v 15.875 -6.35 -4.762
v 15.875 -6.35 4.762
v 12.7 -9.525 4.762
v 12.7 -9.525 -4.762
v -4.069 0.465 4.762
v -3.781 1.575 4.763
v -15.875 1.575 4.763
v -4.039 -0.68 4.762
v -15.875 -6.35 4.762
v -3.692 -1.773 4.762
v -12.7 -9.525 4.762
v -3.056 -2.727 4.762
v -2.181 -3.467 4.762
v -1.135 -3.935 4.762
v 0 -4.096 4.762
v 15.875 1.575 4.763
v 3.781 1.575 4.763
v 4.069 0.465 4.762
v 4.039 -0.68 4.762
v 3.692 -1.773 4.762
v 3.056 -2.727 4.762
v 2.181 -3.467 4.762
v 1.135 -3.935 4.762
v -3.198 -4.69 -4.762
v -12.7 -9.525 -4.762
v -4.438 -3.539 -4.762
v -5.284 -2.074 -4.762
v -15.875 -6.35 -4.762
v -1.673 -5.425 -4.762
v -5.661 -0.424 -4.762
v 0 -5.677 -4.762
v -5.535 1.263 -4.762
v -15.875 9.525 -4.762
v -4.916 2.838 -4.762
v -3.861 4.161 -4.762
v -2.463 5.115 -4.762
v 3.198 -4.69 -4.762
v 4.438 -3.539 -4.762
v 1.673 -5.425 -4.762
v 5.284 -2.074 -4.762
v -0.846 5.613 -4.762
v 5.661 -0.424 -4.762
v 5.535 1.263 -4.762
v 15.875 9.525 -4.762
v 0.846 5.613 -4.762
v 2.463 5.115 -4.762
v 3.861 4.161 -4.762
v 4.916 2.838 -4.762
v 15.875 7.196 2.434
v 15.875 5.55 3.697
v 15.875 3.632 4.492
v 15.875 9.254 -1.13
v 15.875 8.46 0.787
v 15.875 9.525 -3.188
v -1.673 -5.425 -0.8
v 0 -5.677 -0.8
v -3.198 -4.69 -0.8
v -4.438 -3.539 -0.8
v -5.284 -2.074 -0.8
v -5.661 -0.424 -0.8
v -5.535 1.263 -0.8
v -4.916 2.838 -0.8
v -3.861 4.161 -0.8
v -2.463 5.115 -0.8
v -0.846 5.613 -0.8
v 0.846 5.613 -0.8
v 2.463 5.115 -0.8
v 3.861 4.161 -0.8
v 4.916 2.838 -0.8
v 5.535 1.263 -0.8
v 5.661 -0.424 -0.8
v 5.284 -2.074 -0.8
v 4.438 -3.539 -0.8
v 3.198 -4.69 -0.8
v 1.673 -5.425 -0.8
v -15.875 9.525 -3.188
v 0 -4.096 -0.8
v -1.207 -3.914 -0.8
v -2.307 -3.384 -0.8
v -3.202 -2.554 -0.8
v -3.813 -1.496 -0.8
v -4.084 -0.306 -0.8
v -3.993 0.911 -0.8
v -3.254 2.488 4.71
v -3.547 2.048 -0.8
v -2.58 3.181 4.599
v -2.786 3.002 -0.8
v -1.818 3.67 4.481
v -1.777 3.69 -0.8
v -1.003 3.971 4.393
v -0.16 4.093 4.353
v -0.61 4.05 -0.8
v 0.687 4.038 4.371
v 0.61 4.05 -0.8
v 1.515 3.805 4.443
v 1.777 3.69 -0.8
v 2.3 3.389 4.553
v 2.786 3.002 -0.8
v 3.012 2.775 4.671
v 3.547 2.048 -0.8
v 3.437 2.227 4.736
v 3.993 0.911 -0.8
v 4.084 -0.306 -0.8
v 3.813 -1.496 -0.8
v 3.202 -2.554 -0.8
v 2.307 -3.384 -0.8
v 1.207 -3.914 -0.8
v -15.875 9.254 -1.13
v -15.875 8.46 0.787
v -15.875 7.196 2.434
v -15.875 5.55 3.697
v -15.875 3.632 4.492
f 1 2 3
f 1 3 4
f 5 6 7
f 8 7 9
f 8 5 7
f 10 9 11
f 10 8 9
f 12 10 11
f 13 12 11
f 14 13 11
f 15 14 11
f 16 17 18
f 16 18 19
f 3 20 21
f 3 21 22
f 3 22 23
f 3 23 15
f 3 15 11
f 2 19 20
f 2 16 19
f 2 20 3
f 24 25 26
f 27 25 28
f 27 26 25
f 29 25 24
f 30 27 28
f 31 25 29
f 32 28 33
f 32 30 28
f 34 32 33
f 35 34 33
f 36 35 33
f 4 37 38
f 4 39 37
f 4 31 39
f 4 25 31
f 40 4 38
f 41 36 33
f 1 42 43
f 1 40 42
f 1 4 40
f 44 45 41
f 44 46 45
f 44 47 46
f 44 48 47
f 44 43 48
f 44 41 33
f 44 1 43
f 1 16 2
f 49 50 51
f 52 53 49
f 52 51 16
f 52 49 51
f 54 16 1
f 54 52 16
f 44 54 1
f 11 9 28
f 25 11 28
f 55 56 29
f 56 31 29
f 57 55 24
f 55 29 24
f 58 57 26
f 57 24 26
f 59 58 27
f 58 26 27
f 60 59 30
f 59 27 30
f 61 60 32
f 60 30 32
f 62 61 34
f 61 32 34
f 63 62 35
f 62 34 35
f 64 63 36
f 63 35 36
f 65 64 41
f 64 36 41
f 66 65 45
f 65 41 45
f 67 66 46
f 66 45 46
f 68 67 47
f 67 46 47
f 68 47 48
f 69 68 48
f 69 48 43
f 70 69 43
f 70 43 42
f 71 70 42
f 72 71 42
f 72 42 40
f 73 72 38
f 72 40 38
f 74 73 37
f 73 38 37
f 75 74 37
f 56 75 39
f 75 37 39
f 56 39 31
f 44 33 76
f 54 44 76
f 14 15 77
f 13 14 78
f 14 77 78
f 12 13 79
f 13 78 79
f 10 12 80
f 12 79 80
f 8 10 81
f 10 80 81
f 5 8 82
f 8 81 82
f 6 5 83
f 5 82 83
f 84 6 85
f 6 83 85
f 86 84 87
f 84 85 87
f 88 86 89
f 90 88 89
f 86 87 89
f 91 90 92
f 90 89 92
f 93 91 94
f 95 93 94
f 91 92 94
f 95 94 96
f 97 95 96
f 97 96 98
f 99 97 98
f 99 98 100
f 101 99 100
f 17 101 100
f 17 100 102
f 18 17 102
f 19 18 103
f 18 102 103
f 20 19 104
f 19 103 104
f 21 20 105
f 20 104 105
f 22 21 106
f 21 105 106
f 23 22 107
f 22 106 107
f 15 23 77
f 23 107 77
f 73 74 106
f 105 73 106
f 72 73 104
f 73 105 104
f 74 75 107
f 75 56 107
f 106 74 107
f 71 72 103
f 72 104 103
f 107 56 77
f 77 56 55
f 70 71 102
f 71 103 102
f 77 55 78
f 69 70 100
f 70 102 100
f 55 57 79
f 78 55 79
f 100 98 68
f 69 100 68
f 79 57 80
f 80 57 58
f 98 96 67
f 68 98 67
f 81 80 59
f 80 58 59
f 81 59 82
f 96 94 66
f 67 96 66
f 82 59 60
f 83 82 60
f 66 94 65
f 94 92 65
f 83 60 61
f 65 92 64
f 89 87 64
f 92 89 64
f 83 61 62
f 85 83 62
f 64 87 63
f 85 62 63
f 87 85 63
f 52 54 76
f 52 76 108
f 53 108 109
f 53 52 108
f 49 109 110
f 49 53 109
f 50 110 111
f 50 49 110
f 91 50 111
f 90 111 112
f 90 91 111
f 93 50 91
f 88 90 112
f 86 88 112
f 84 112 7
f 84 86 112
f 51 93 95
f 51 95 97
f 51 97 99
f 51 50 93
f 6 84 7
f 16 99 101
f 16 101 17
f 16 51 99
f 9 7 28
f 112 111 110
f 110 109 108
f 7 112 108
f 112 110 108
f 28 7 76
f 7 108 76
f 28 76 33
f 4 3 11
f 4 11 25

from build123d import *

# Parameters (mm, degrees)
BOSS_EXTRUDE2_DEPTH = 15.875
CHAMFER1_SIZE       = 3.175


with BuildPart() as part:
    # Sketch3 → Boss-Extrude2 (new, symmetric)
    with BuildSketch(Plane(origin=(0, 0, 0), x_dir=(0, 0, -1), z_dir=(1, 0, 0))):
        with BuildLine():
            ThreePointArc((3.1877, 9.525), (-2.433940332, 7.196440332), (-4.7625, 1.5748))
            Line((-4.7625, 1.5748), (-4.7625, -9.525))
            Line((-4.7625, -9.525), (4.7625, -9.525))
            Line((4.7625, -9.525), (4.7625, 9.525))
            Line((4.7625, 9.525), (3.1877, 9.525))
        make_face()
    extrude(amount=BOSS_EXTRUDE2_DEPTH, both=True)

    # Chamfer1
    chamfer1_edges = [part.edges().sort_by_distance(p)[0] for p in [
        (15.875, -9.525, 0),
        (-15.875, -9.525, 0),
    ]]
    chamfer(chamfer1_edges, length=CHAMFER1_SIZE)

    # Sketch4 → Cut-Revolve2 (revolve, cut)
    with BuildSketch(Plane(origin=(0, 0, 0), x_dir=(0, 0, -1), z_dir=(1, 0, 0)), mode=Mode.PRIVATE) as cut_revolve2_sk:
        Polygon((-4.7625, 4.09575), (0.8001, 4.09575), (0.8001, 5.6769), (4.7625, 5.6769), (4.7625, 0), (-4.7625, 0), align=None)
    revolve(cut_revolve2_sk.sketch.rotate(Axis((0, 0, 4.7625), (0, 0, -1)), 180), axis=Axis((0, 0, 4.7625), (0, 0, -1)), mode=Mode.SUBTRACT)


solid = part.part
